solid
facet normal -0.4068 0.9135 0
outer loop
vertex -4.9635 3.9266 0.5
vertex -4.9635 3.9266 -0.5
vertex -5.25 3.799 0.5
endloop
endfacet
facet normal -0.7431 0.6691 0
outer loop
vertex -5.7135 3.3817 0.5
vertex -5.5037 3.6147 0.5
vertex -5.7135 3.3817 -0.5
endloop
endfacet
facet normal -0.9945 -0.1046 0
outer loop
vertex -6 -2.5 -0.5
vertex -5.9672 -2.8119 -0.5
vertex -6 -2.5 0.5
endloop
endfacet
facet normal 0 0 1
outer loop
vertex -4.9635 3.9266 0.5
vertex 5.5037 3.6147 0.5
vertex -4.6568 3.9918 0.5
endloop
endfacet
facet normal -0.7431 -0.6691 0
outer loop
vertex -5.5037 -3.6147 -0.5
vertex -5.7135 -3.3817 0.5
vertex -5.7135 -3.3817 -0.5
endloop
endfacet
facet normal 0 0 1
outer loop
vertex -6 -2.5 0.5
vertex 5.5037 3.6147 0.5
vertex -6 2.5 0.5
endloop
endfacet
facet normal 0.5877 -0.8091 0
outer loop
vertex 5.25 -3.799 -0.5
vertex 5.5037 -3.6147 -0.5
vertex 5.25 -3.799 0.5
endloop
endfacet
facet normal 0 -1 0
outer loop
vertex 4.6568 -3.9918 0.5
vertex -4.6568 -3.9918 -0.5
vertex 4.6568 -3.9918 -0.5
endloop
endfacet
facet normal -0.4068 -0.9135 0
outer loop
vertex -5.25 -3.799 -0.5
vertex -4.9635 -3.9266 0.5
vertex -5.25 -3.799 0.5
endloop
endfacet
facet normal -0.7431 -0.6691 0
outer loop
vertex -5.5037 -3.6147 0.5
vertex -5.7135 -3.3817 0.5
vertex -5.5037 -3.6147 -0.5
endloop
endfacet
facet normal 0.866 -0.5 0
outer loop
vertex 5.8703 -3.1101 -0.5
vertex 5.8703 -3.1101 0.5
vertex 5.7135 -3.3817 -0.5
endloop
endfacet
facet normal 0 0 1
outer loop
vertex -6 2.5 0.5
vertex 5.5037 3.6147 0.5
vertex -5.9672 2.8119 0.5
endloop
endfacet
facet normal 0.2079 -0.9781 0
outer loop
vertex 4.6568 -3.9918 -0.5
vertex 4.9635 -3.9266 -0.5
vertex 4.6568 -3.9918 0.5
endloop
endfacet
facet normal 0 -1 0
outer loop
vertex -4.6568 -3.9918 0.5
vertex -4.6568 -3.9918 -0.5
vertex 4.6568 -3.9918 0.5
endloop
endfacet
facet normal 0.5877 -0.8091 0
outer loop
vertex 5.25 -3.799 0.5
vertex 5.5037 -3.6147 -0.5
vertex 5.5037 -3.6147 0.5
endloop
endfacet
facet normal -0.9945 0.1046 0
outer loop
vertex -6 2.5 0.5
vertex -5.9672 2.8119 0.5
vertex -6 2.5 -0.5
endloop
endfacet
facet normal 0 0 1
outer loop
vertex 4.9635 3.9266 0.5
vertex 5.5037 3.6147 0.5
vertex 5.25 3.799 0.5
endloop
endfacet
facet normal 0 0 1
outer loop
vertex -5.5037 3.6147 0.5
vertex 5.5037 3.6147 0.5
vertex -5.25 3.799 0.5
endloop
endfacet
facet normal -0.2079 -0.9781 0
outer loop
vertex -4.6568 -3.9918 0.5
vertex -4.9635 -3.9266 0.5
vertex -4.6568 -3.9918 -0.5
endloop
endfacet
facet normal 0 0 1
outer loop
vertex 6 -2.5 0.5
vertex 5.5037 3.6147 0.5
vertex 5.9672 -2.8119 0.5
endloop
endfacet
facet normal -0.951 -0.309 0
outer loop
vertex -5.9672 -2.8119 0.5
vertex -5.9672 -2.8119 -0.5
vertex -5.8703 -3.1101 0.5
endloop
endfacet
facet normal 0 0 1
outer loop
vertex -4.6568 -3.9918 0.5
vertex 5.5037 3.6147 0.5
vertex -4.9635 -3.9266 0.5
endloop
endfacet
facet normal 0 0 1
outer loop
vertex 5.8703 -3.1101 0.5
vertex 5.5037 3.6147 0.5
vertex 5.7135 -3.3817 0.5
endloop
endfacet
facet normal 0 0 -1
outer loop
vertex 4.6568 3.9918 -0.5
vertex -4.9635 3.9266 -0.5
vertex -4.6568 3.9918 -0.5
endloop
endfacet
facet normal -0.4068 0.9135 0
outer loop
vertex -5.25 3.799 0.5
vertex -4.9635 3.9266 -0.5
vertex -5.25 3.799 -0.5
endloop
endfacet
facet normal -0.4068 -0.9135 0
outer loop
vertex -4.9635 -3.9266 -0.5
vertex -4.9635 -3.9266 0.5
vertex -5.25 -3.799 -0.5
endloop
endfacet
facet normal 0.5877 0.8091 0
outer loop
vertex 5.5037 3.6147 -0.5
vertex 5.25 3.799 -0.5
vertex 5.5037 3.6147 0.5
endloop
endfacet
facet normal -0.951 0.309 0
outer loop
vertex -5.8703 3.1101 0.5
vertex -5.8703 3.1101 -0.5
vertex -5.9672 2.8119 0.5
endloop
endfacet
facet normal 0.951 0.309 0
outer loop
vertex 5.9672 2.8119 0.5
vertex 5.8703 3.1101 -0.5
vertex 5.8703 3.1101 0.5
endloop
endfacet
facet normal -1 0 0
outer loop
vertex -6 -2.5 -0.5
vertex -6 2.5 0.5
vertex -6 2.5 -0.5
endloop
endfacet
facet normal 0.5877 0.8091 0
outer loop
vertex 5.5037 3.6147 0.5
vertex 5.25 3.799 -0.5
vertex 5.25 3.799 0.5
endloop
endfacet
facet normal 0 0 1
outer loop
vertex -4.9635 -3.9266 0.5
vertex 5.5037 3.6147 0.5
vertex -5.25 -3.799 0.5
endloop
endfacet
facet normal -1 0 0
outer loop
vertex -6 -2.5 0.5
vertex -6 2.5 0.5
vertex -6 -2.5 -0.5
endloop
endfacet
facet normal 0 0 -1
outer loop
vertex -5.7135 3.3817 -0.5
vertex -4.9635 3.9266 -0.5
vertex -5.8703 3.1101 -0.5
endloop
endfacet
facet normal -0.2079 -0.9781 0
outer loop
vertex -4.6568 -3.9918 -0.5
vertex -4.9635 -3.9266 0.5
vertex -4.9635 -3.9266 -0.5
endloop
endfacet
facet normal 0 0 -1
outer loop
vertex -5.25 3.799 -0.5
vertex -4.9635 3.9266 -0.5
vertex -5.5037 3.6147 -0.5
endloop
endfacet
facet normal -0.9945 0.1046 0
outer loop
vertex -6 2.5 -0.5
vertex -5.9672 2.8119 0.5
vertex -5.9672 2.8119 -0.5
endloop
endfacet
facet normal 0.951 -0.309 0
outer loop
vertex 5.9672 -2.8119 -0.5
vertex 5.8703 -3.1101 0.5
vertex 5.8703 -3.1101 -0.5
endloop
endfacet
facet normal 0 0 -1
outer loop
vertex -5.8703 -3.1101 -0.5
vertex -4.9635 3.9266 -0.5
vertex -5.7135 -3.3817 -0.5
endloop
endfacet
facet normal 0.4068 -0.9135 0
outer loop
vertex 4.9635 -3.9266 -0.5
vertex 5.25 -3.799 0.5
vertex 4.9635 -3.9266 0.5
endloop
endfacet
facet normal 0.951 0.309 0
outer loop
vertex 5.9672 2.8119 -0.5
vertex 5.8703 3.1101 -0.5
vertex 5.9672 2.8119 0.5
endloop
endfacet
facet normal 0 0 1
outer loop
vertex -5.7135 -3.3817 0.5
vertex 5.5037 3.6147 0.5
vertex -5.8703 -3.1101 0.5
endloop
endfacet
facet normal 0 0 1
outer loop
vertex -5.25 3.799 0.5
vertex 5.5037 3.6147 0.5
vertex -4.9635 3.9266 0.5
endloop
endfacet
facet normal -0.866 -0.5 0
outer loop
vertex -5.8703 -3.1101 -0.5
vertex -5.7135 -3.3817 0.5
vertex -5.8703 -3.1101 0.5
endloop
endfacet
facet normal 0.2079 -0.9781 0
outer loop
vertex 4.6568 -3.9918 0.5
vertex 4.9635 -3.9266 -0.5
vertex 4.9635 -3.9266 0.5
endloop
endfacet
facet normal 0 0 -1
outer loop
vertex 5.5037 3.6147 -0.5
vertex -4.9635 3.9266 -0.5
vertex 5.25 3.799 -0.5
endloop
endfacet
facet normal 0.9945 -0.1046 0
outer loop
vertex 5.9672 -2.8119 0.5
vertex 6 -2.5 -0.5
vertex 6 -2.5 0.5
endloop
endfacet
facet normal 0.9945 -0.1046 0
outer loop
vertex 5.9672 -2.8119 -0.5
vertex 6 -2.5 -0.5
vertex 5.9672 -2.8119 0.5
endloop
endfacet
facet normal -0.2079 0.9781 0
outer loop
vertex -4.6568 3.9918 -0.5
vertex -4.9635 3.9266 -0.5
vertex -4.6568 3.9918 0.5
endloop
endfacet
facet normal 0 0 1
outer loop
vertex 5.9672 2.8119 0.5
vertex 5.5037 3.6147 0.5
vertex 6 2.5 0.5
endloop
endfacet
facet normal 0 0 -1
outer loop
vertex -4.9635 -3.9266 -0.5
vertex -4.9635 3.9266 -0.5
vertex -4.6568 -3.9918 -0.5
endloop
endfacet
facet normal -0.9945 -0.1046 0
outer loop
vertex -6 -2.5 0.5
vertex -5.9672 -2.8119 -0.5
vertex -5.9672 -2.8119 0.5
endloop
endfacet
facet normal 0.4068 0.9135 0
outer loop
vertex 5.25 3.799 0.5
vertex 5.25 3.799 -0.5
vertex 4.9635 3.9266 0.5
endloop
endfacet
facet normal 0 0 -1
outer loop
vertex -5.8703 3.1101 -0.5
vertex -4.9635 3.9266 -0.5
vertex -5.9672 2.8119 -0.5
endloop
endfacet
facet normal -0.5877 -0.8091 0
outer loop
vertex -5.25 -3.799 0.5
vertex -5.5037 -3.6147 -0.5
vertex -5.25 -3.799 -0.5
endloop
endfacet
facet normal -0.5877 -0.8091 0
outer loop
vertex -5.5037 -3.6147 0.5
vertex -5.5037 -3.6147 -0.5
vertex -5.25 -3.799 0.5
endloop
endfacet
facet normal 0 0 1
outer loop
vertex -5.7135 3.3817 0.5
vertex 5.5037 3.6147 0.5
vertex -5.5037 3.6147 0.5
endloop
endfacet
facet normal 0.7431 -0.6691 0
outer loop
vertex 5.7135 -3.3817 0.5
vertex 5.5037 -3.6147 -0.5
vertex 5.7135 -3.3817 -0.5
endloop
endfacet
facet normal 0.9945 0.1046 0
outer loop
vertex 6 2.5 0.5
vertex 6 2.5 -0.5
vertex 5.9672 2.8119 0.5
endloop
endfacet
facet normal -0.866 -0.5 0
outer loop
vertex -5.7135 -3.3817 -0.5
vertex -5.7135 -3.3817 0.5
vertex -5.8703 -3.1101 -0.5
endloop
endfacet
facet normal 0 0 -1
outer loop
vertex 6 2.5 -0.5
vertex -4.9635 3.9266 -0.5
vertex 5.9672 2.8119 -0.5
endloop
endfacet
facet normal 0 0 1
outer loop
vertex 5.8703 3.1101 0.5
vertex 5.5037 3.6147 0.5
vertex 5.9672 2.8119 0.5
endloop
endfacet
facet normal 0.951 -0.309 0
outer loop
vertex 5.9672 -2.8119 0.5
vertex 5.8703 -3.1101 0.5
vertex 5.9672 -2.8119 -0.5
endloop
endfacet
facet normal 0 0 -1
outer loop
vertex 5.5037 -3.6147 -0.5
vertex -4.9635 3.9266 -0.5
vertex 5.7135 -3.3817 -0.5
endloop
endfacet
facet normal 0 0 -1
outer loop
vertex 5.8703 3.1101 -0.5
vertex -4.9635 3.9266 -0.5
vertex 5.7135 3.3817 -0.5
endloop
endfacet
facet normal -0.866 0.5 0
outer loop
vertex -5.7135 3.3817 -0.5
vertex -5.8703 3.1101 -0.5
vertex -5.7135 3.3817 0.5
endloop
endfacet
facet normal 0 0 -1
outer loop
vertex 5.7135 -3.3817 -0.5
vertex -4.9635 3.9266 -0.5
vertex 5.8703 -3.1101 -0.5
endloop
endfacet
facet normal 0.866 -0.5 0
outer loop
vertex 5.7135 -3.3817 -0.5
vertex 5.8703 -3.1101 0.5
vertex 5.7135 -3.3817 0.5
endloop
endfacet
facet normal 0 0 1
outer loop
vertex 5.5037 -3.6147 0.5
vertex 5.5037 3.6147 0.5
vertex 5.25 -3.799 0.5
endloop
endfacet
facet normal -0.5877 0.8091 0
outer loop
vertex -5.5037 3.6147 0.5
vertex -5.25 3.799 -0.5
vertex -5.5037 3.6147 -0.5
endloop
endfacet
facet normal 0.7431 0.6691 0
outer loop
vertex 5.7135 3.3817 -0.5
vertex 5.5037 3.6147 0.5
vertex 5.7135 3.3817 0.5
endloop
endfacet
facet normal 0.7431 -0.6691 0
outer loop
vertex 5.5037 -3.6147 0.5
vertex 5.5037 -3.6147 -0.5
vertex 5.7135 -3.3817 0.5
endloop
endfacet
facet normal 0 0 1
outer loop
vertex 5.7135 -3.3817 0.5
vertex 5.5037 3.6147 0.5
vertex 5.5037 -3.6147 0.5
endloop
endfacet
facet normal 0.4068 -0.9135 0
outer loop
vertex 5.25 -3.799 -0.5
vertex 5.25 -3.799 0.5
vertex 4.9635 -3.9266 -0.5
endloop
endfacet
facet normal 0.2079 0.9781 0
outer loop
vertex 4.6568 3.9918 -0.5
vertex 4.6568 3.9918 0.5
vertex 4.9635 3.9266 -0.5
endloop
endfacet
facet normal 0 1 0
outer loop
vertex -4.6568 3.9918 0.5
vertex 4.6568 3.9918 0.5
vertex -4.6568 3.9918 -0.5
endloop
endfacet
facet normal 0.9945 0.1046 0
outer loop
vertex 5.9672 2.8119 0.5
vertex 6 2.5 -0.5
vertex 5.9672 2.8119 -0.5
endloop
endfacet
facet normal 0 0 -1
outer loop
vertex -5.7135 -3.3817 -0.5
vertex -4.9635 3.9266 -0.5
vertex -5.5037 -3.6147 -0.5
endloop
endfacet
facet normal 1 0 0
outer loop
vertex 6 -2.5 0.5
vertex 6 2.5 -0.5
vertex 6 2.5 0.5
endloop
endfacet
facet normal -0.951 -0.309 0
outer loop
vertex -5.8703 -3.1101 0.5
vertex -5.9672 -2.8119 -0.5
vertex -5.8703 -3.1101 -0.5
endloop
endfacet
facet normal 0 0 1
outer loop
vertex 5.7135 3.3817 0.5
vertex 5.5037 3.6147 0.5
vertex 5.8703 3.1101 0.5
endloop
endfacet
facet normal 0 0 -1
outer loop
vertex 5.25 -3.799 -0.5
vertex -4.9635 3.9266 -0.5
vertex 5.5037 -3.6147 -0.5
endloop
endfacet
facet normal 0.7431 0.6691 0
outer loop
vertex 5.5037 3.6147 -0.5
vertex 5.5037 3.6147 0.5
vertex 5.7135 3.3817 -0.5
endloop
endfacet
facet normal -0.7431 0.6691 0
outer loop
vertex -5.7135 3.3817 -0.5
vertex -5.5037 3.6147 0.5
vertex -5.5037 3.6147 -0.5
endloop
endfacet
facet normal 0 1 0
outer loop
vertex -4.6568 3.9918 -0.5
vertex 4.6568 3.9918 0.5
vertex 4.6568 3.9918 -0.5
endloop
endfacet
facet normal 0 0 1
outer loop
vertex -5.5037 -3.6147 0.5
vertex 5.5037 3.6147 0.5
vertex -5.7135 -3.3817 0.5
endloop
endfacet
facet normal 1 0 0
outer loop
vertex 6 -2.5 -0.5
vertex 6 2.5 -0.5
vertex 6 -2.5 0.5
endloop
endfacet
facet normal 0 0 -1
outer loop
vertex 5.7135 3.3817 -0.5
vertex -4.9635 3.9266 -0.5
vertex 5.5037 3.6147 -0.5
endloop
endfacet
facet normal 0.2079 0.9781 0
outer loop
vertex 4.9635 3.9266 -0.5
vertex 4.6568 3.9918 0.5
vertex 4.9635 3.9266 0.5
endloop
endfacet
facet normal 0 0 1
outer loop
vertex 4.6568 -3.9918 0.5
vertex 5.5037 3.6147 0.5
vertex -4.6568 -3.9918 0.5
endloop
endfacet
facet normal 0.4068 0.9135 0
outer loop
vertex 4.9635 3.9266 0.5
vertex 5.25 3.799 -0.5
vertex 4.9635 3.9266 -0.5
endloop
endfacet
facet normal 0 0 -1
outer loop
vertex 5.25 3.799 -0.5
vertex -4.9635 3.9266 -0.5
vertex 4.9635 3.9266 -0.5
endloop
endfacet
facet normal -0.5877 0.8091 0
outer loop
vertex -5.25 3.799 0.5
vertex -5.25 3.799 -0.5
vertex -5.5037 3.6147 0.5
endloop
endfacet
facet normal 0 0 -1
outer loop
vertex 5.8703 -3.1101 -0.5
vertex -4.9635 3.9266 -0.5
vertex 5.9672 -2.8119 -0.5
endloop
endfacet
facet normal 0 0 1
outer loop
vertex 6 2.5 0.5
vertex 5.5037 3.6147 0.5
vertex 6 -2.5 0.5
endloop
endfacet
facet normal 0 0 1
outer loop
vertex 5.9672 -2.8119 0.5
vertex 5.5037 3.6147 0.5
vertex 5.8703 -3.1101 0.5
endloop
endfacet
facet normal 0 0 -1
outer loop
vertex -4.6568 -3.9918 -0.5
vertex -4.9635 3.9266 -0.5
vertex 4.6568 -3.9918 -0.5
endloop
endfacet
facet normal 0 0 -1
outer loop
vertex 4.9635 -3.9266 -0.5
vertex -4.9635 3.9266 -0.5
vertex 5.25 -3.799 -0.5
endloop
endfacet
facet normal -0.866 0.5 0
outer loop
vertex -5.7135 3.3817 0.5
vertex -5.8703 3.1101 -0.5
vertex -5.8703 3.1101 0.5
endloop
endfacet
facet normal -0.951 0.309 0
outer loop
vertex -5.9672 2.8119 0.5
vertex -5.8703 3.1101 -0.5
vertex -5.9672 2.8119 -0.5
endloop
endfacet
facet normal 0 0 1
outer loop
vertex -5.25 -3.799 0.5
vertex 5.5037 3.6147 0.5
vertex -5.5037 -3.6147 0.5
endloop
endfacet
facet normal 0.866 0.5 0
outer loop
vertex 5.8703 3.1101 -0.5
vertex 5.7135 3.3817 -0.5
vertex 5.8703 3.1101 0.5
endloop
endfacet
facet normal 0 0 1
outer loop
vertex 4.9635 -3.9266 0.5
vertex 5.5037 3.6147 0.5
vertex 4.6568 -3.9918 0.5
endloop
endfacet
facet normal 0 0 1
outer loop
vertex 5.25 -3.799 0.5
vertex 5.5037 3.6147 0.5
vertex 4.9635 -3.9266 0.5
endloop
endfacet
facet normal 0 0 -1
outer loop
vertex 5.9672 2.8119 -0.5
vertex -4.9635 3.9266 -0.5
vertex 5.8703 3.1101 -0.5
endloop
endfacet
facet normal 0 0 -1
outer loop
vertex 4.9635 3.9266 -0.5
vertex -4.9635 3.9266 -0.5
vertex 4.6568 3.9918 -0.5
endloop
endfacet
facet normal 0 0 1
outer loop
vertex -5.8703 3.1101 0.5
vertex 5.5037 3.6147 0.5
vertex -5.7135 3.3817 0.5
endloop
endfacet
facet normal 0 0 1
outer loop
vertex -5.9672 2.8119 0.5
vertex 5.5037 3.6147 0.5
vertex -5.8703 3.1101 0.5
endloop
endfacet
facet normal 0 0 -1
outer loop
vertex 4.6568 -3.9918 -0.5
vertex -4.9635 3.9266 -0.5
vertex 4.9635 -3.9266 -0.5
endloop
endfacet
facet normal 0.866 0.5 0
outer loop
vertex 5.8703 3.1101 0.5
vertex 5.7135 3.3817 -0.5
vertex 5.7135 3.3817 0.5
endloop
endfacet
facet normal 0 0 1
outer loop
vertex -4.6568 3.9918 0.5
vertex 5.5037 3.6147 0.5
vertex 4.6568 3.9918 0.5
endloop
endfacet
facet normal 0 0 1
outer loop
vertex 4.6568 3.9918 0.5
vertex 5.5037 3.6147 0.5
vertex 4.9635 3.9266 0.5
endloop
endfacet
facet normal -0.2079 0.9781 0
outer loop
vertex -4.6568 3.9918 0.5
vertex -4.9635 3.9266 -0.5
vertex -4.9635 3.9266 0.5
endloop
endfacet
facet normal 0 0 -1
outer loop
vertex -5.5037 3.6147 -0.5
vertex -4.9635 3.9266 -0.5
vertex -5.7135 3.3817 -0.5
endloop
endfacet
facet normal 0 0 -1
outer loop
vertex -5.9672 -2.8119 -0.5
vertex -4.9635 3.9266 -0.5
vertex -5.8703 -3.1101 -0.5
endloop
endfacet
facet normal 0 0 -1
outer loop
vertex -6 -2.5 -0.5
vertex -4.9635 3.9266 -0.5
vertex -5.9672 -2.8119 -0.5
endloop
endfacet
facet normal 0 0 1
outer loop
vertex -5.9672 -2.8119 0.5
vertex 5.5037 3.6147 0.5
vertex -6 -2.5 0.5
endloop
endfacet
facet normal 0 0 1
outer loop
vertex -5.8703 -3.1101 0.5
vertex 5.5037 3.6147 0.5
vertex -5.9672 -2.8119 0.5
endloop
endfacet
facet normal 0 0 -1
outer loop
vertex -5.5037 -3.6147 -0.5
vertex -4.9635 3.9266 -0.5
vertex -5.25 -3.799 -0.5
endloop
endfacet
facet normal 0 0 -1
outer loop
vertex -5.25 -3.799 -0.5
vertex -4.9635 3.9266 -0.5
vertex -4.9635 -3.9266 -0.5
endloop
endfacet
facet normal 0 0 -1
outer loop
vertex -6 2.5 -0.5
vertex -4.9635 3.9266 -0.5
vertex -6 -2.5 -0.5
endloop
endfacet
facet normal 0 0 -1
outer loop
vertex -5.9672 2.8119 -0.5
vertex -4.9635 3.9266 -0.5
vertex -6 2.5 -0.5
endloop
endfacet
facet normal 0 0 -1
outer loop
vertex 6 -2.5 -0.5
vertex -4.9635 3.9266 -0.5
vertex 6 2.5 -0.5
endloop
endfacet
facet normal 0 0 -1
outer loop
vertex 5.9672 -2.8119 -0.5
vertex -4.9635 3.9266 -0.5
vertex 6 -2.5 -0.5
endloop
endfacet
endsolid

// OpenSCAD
centered = false;
x = 12;
y = 8;
z = 1;
radius = 1.5;

module cube_rounded_side(size, center, radius) {
    width = size[0];
    depth = size[1];
    height = size[2];
    
    obj_translate = (center == false) ? [0, 0, 0] : [width/-2, depth/-2, height/-2];
    translate(obj_translate)
        hull() {
            translate([radius, radius, 0]) cylinder(r = radius, h = height);
            translate([width - radius, radius, 0]) cylinder(r = radius, h = height);
            translate([radius, depth - radius, 0]) cylinder(r = radius, h = height);
            translate([width - radius, depth - radius, 0]) cylinder(r = radius, h = height);
        }
}

cube_rounded_side([x, y, z], true, radius);
$fs = 0.1;
